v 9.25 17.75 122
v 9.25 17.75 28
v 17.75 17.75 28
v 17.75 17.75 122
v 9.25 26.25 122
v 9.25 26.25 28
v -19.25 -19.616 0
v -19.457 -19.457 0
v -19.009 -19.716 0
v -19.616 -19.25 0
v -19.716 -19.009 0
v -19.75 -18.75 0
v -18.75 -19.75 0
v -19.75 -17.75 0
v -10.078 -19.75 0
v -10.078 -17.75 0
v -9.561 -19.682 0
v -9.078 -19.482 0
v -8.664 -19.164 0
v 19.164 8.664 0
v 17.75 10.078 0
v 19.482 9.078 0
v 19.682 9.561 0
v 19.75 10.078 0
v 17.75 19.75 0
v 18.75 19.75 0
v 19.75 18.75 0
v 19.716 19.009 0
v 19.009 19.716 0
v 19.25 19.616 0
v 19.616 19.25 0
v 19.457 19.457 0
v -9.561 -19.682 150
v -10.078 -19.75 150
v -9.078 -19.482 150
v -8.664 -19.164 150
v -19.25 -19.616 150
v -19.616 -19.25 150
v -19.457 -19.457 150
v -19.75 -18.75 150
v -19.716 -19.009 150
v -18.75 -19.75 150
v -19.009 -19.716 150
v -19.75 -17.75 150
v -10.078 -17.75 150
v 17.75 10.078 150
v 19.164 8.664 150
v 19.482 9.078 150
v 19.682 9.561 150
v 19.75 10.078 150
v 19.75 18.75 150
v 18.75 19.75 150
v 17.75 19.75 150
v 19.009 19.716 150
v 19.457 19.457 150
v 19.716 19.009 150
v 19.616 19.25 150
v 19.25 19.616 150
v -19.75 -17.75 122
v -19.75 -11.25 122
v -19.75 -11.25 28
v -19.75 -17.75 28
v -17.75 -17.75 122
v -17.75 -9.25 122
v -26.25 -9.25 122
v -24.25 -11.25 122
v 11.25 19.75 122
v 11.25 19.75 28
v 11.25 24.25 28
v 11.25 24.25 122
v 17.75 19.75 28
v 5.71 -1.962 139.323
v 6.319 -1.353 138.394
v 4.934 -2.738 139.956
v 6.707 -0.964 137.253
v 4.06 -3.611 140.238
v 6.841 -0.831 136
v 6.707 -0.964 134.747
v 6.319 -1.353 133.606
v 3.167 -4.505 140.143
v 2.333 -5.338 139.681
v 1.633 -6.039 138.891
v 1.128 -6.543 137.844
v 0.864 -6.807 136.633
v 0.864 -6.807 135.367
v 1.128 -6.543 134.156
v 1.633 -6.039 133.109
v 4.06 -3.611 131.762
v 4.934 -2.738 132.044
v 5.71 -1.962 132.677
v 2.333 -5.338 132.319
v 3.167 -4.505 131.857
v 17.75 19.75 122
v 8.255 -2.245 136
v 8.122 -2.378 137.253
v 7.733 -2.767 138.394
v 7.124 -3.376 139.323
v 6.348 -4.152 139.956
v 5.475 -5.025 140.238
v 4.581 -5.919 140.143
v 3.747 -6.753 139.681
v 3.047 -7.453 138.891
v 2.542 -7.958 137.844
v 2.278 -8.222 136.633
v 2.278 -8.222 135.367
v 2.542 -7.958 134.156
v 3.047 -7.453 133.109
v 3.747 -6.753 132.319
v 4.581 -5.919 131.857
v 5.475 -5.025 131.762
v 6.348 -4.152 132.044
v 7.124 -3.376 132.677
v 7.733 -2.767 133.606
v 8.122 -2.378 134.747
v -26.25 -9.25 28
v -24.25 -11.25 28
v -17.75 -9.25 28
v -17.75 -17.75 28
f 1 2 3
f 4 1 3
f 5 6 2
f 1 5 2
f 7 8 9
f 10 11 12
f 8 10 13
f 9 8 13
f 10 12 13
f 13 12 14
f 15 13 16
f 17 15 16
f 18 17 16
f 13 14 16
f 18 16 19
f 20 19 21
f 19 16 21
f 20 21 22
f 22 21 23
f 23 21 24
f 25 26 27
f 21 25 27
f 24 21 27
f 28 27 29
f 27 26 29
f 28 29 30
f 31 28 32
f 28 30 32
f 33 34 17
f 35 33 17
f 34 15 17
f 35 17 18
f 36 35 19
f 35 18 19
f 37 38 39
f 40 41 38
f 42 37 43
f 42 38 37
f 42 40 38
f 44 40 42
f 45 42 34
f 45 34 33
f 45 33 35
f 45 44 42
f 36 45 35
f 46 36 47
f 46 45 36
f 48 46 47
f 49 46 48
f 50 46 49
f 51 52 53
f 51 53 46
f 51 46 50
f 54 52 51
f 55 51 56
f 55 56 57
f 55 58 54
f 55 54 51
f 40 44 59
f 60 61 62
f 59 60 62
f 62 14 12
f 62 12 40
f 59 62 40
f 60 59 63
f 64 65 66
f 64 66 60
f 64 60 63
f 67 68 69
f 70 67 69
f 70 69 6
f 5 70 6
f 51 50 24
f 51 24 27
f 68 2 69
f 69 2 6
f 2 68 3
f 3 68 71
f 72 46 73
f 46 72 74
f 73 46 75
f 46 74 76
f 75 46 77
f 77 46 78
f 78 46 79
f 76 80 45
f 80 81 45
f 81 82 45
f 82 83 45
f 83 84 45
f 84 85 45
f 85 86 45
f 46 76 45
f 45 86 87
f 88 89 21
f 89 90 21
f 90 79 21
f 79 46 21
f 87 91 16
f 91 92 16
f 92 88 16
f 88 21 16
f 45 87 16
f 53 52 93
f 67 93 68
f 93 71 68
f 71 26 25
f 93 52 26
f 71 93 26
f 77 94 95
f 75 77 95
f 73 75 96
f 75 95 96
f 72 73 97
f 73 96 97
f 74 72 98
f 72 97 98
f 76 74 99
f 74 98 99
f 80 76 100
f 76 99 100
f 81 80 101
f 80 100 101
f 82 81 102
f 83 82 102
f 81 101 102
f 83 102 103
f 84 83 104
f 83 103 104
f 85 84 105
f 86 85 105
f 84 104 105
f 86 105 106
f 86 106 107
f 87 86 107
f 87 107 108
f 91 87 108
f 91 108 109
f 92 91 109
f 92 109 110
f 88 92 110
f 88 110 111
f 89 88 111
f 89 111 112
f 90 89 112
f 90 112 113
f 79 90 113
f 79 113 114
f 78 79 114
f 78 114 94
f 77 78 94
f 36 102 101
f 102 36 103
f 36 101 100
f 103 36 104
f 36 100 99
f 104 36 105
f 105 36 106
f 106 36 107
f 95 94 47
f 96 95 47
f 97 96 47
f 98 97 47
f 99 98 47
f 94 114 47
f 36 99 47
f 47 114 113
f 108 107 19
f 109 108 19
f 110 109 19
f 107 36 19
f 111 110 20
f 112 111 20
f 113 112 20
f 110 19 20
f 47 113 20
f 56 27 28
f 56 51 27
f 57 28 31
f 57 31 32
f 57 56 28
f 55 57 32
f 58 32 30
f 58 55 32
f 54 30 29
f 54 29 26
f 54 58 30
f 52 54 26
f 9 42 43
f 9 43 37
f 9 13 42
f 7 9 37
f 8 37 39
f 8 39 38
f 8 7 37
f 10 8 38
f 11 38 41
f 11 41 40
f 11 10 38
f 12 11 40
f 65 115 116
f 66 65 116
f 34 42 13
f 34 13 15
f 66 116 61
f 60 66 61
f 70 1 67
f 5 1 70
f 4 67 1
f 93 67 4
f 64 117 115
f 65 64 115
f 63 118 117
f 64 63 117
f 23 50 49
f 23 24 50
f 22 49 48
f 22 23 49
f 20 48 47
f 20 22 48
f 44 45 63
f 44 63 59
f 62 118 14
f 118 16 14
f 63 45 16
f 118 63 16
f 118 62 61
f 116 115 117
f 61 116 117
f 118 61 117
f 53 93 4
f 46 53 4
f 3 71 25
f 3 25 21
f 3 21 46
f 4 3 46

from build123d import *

# Parameters (mm, degrees)
F1_DEPTH = 28
F3_DEPTH = 94
F5_DEPTH = 28
F6_R     = 2
F7_R     = 1
F8_R     = 4.25
F9_DEPTH = 25


with BuildPart() as f1:
    # F0 (on Top) → F1 (new body)
    with BuildSketch(Plane.XY):
        Polygon((-19.75, -17.750001), (-19.75, -19.75), (-9.25, -19.75), (19.75, 9.25), (19.75, 19.75), (17.750001, 19.75), (17.750001, 10.078427), (-10.078427, -17.750001), align=None)
    extrude(amount=F1_DEPTH)

    # F2 (on face) → F3 (join)
    with BuildSketch(Plane.XY.offset(28)):
        Polygon((-19.75, -19.75), (-9.25, -19.75), (19.75, 9.25), (19.75, 19.75), (11.25, 19.75), (11.25, 24.25), (9.25, 26.25), (9.25, 23.421573), (9.25, 19.75), (9.25, 17.750001), (17.750001, 17.750001), (17.750001, 10.078427), (16.585787, 8.914213), (-8.914213, -16.585787), (-10.078427, -17.750001), (-17.750001, -17.750001), (-17.750001, -9.25), (-19.75, -9.25), (-23.421573, -9.25), (-26.25, -9.25), (-24.25, -11.25), (-19.75, -11.25), align=None)
    extrude(amount=F3_DEPTH)

    # F4 (on face) → F5 (join)
    with BuildSketch(Plane.XY.offset(122)):
        Polygon((19.75, 9.25), (19.75, 19.75), (17.750001, 19.75), (17.750001, 10.078427), (-10.078427, -17.750001), (-19.75, -17.750001), (-19.75, -19.75), (-9.25, -19.75), align=None)
    extrude(amount=F5_DEPTH)

    # F6
    f6_edges = [f1.edges().sort_by_distance(p)[0] for p in [
        (19.75, 9.25, 75),
        (-9.25, -19.75, 75),
    ]]
    fillet(f6_edges, radius=F6_R)

    # F7
    f7_edges = [f1.edges().sort_by_distance(p)[0] for p in [
        (-19.75, -19.75, 75),
        (19.75, 19.75, 75),
    ]]
    fillet(f7_edges, radius=F7_R)

    # F8 (on face) → F9 (cut)
    with BuildSketch(Plane(origin=(5.25, -5.25, 0), x_dir=(0.707107, 0.707107, 0), z_dir=(0.707107, -0.707107, 0))):
        with Locations((0, 136)):
            Circle(F8_R)
    extrude(amount=-F9_DEPTH, mode=Mode.SUBTRACT)


solid = f1.part
